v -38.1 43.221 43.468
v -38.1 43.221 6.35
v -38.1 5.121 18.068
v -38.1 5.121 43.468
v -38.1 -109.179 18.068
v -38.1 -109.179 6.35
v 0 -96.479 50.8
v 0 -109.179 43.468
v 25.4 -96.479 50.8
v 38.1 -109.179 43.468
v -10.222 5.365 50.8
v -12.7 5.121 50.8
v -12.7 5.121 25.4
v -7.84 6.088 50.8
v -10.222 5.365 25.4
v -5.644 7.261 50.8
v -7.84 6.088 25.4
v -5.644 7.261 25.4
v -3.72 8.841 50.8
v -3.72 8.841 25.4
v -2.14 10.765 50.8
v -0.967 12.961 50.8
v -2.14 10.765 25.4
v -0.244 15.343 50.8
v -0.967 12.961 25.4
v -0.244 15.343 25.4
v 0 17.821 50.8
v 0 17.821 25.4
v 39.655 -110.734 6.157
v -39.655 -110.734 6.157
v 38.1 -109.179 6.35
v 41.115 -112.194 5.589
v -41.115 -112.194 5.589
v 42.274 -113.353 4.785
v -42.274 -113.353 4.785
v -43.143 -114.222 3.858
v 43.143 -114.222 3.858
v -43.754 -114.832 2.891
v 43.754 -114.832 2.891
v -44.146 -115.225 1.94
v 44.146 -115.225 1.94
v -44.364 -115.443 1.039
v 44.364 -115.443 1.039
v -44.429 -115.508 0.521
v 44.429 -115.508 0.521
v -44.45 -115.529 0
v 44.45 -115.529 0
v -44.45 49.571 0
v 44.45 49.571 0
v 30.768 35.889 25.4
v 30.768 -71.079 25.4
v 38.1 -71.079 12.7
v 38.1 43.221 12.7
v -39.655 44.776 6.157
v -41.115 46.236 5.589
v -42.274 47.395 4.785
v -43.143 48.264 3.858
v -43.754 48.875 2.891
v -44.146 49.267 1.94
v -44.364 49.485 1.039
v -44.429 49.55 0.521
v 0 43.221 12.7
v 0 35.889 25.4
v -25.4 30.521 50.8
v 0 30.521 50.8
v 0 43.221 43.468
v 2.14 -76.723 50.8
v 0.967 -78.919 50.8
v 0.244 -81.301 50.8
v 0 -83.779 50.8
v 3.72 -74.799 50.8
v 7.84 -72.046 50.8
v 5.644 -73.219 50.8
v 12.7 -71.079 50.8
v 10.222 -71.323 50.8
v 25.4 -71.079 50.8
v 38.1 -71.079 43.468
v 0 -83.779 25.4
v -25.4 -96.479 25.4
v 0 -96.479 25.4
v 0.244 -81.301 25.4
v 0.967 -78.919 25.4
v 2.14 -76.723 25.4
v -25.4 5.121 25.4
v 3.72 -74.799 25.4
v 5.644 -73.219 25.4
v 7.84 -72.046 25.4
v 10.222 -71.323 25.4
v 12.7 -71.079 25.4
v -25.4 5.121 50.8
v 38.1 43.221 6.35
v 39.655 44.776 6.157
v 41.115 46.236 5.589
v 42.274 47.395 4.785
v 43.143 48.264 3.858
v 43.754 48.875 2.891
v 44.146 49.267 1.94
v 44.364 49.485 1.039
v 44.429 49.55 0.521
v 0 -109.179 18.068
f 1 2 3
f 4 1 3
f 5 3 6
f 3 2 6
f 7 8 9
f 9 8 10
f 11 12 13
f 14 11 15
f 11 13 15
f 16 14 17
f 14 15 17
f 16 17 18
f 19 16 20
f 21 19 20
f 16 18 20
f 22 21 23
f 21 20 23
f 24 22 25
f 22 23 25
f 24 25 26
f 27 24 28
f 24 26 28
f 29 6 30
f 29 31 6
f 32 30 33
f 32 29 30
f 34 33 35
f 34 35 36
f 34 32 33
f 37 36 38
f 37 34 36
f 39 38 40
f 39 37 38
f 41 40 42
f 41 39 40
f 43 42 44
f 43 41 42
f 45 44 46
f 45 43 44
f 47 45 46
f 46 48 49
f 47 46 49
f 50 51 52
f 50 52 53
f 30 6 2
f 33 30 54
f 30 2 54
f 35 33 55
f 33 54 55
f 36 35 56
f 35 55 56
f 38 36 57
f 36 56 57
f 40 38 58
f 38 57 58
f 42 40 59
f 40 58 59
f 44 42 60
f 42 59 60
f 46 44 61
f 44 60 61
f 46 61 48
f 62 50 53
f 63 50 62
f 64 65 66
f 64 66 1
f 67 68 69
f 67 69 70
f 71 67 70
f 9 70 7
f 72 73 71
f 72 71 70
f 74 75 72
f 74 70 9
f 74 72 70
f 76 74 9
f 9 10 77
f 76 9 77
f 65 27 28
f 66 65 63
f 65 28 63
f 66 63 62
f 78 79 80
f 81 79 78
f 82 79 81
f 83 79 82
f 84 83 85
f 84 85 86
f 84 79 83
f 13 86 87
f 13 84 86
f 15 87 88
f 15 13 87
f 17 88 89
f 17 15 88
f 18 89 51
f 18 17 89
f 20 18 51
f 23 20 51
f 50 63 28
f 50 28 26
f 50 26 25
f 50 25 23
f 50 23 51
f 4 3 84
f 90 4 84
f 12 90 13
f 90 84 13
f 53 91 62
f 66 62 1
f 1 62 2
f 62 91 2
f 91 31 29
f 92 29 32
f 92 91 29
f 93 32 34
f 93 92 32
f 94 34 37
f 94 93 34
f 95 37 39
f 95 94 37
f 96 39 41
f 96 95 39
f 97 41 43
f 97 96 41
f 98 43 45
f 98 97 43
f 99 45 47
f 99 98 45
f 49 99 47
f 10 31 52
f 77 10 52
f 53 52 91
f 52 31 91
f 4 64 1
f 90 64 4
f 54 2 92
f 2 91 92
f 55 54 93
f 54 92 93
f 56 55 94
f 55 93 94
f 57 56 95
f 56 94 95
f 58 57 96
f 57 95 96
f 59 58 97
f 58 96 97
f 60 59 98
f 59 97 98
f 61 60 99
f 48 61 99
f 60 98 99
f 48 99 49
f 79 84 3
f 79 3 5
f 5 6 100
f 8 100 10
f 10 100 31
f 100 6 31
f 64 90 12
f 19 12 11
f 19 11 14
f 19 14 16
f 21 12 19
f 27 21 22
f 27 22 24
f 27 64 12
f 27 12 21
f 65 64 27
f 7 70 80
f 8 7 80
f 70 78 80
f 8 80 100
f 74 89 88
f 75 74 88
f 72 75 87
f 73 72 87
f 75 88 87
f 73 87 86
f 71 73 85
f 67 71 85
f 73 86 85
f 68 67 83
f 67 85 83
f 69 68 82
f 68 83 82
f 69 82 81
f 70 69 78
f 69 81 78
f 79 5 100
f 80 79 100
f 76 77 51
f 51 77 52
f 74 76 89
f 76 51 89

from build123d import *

# Parameters (mm, degrees)
F0_W        = 88.9
F0_H        = 165.1
F1_DEPTH    = 6.35
F2_DEPTH    = 50.8
F3_DEPTH    = 25.4
F4_R        = 6.34999
F5_C1_SIZE2 = 12.7
F5_C1_SIZE  = 7.3323484187
F5_C2_SIZE2 = 12.7
F5_C2_SIZE  = 7.3323484187
F5_C3_SIZE2 = 7.3323484187
F5_C3_SIZE  = 12.7
F5_C4_SIZE2 = 12.7
F5_C4_SIZE  = 7.3323484187
F5_C5_SIZE2 = 7.3323484187
F5_C5_SIZE  = 12.7
F5_C6_SIZE2 = 7.3323484187
F5_C6_SIZE  = 12.7
F6_SIZE2    = 7.3323484187
F6_SIZE     = 12.7


# Not quite as in the source:
# - a fillet or chamfer is up to 0.001 mm smaller than in the source, because OpenCascade refuses the exact size


with BuildPart() as f1:
    # F0 (on Top) → F1 (new body)
    with BuildSketch(Plane.XY):
        with Locations((0, -32.9789540072)):
            Rectangle(F0_W, F0_H)
        Polygon((-38.1, 5.1210459928), (-38.1, 43.2210459928), (0, 43.2210459928), (38.1, 43.2210459928), (38.1, -71.0789540072), (38.1, -109.1789540072), (0, -109.1789540072), (-38.1, -109.1789540072), align=None, mode=Mode.SUBTRACT)
    extrude(amount=F1_DEPTH)

    # F0 (on Top) → F2 (join)
    with BuildSketch(Plane.XY):
        with BuildLine():
            Line((0, 43.2210459928), (-38.1, 43.2210459928))
            Line((-38.1, 43.2210459928), (-38.1, 5.1210459928))
            Line((-38.1, 5.1210459928), (-12.7, 5.1210459928))
            ThreePointArc((-12.7, 5.1210459928), (-3.7197438789, 8.8407898717), (0, 17.8210459928))
            Line((0, 17.8210459928), (0, 43.2210459928))
        make_face()
        with BuildLine():
            Line((38.1, -109.1789540072), (38.1, -71.0789540072))
            Line((38.1, -71.0789540072), (12.7, -71.0789540072))
            ThreePointArc((12.7, -71.0789540072), (3.7197438789, -74.7986978861), (0, -83.7789540072))
            Line((0, -83.7789540072), (0, -109.1789540072))
            Line((0, -109.1789540072), (38.1, -109.1789540072))
        make_face()
    extrude(amount=F2_DEPTH)

    # F0 (on Top) → F3 (join)
    with BuildSketch(Plane.XY):
        with BuildLine():
            Line((38.1, 43.2210459928), (0, 43.2210459928))
            Line((0, 43.2210459928), (0, 17.8210459928))
            ThreePointArc((0, 17.8210459928), (-3.7197438789, 8.8407898717), (-12.7, 5.1210459928))
            Line((-12.7, 5.1210459928), (-38.1, 5.1210459928))
            Line((-38.1, 5.1210459928), (-38.1, -109.1789540072))
            Line((-38.1, -109.1789540072), (0, -109.1789540072))
            Line((0, -109.1789540072), (0, -83.7789540072))
            ThreePointArc((0, -83.7789540072), (3.7197438789, -74.7986978861), (12.7, -71.0789540072))
            Line((12.7, -71.0789540072), (38.1, -71.0789540072))
            Line((38.1, -71.0789540072), (38.1, 43.2210459928))
        make_face()
    extrude(amount=F3_DEPTH)

    # F4 (radius 6.35 in the source; OpenCascade refuses exactly that, so slightly less here)
    f4_edges = [f1.edges().sort_by_distance(p)[0] for p in [
        (44.45, -32.978954, 6.35),
        (0, 49.571046, 6.35),
        (0, -115.528954, 6.35),
        (-44.45, -32.978954, 6.35),
    ]]
    fillet(f4_edges, radius=F4_R)

    # F5: chamfer of 12.7 x 7.3323484187 on 6 edges, made by hand

    # F5_c1
    f5_c1_edges = [f1.edges().sort_by_distance(p)[0] for p in [
        (-38.1, 24.1710459928, 50.8),
    ]]
    f5_c1_side = f1.faces().sort_by_distance((-38.1, 24.1710459928, 50.6533530316))[0]
    chamfer(f5_c1_edges, length=F5_C1_SIZE, length2=F5_C1_SIZE2, reference=f5_c1_side)

    # F5_c2
    f5_c2_edges = [f1.edges().sort_by_distance(p)[0] for p in [
        (-38.1, -52.0289540072, 25.4),
    ]]
    f5_c2_side = f1.faces().sort_by_distance((-38.1, -52.0289540072, 25.2533530316))[0]
    chamfer(f5_c2_edges, length=F5_C2_SIZE, length2=F5_C2_SIZE2, reference=f5_c2_side)

    # F5_c3
    f5_c3_edges = [f1.edges().sort_by_distance(p)[0] for p in [
        (19.05, 43.2210459928, 25.4),
    ]]
    f5_c3_side = f1.faces().sort_by_distance((19.05, 43.2210459928, 25.2533530316))[0]
    chamfer(f5_c3_edges, length=F5_C3_SIZE, length2=F5_C3_SIZE2, reference=f5_c3_side)

    # F5_c4
    f5_c4_edges = [f1.edges().sort_by_distance(p)[0] for p in [
        (-12.7, 43.2210459928, 50.8),
    ]]
    f5_c4_side = f1.faces().sort_by_distance((-12.7, 43.2210459928, 50.6533530316))[0]
    chamfer(f5_c4_edges, length=F5_C4_SIZE, length2=F5_C4_SIZE2, reference=f5_c4_side)

    # F5_c5
    f5_c5_edges = [f1.edges().sort_by_distance(p)[0] for p in [
        (38.1, -17.5951282165, 25.4),
    ]]
    f5_c5_side = f1.faces().sort_by_distance((38.1, -17.5951282165, 25.2533530316))[0]
    chamfer(f5_c5_edges, length=F5_C5_SIZE, length2=F5_C5_SIZE2, reference=f5_c5_side)

    # F5_c6
    f5_c6_edges = [f1.edges().sort_by_distance(p)[0] for p in [
        (-12.7, -109.1789540072, 25.4),
    ]]
    f5_c6_side = f1.faces().sort_by_distance((-12.7, -109.0323070388, 25.4))[0]
    chamfer(f5_c6_edges, length=F5_C6_SIZE, length2=F5_C6_SIZE2, reference=f5_c6_side)

    # F6
    f6_edges = [f1.edges().sort_by_distance(p)[0] for p in [
        (19.05, -109.178954, 50.8),
        (38.1, -90.128954, 50.8),
    ]]
    f6_side = f1.faces().sort_by_distance((19.446042, -90.524996, 50.8))[0]
    chamfer(f6_edges, length=F6_SIZE, length2=F6_SIZE2, reference=f6_side)


solid = f1.part
